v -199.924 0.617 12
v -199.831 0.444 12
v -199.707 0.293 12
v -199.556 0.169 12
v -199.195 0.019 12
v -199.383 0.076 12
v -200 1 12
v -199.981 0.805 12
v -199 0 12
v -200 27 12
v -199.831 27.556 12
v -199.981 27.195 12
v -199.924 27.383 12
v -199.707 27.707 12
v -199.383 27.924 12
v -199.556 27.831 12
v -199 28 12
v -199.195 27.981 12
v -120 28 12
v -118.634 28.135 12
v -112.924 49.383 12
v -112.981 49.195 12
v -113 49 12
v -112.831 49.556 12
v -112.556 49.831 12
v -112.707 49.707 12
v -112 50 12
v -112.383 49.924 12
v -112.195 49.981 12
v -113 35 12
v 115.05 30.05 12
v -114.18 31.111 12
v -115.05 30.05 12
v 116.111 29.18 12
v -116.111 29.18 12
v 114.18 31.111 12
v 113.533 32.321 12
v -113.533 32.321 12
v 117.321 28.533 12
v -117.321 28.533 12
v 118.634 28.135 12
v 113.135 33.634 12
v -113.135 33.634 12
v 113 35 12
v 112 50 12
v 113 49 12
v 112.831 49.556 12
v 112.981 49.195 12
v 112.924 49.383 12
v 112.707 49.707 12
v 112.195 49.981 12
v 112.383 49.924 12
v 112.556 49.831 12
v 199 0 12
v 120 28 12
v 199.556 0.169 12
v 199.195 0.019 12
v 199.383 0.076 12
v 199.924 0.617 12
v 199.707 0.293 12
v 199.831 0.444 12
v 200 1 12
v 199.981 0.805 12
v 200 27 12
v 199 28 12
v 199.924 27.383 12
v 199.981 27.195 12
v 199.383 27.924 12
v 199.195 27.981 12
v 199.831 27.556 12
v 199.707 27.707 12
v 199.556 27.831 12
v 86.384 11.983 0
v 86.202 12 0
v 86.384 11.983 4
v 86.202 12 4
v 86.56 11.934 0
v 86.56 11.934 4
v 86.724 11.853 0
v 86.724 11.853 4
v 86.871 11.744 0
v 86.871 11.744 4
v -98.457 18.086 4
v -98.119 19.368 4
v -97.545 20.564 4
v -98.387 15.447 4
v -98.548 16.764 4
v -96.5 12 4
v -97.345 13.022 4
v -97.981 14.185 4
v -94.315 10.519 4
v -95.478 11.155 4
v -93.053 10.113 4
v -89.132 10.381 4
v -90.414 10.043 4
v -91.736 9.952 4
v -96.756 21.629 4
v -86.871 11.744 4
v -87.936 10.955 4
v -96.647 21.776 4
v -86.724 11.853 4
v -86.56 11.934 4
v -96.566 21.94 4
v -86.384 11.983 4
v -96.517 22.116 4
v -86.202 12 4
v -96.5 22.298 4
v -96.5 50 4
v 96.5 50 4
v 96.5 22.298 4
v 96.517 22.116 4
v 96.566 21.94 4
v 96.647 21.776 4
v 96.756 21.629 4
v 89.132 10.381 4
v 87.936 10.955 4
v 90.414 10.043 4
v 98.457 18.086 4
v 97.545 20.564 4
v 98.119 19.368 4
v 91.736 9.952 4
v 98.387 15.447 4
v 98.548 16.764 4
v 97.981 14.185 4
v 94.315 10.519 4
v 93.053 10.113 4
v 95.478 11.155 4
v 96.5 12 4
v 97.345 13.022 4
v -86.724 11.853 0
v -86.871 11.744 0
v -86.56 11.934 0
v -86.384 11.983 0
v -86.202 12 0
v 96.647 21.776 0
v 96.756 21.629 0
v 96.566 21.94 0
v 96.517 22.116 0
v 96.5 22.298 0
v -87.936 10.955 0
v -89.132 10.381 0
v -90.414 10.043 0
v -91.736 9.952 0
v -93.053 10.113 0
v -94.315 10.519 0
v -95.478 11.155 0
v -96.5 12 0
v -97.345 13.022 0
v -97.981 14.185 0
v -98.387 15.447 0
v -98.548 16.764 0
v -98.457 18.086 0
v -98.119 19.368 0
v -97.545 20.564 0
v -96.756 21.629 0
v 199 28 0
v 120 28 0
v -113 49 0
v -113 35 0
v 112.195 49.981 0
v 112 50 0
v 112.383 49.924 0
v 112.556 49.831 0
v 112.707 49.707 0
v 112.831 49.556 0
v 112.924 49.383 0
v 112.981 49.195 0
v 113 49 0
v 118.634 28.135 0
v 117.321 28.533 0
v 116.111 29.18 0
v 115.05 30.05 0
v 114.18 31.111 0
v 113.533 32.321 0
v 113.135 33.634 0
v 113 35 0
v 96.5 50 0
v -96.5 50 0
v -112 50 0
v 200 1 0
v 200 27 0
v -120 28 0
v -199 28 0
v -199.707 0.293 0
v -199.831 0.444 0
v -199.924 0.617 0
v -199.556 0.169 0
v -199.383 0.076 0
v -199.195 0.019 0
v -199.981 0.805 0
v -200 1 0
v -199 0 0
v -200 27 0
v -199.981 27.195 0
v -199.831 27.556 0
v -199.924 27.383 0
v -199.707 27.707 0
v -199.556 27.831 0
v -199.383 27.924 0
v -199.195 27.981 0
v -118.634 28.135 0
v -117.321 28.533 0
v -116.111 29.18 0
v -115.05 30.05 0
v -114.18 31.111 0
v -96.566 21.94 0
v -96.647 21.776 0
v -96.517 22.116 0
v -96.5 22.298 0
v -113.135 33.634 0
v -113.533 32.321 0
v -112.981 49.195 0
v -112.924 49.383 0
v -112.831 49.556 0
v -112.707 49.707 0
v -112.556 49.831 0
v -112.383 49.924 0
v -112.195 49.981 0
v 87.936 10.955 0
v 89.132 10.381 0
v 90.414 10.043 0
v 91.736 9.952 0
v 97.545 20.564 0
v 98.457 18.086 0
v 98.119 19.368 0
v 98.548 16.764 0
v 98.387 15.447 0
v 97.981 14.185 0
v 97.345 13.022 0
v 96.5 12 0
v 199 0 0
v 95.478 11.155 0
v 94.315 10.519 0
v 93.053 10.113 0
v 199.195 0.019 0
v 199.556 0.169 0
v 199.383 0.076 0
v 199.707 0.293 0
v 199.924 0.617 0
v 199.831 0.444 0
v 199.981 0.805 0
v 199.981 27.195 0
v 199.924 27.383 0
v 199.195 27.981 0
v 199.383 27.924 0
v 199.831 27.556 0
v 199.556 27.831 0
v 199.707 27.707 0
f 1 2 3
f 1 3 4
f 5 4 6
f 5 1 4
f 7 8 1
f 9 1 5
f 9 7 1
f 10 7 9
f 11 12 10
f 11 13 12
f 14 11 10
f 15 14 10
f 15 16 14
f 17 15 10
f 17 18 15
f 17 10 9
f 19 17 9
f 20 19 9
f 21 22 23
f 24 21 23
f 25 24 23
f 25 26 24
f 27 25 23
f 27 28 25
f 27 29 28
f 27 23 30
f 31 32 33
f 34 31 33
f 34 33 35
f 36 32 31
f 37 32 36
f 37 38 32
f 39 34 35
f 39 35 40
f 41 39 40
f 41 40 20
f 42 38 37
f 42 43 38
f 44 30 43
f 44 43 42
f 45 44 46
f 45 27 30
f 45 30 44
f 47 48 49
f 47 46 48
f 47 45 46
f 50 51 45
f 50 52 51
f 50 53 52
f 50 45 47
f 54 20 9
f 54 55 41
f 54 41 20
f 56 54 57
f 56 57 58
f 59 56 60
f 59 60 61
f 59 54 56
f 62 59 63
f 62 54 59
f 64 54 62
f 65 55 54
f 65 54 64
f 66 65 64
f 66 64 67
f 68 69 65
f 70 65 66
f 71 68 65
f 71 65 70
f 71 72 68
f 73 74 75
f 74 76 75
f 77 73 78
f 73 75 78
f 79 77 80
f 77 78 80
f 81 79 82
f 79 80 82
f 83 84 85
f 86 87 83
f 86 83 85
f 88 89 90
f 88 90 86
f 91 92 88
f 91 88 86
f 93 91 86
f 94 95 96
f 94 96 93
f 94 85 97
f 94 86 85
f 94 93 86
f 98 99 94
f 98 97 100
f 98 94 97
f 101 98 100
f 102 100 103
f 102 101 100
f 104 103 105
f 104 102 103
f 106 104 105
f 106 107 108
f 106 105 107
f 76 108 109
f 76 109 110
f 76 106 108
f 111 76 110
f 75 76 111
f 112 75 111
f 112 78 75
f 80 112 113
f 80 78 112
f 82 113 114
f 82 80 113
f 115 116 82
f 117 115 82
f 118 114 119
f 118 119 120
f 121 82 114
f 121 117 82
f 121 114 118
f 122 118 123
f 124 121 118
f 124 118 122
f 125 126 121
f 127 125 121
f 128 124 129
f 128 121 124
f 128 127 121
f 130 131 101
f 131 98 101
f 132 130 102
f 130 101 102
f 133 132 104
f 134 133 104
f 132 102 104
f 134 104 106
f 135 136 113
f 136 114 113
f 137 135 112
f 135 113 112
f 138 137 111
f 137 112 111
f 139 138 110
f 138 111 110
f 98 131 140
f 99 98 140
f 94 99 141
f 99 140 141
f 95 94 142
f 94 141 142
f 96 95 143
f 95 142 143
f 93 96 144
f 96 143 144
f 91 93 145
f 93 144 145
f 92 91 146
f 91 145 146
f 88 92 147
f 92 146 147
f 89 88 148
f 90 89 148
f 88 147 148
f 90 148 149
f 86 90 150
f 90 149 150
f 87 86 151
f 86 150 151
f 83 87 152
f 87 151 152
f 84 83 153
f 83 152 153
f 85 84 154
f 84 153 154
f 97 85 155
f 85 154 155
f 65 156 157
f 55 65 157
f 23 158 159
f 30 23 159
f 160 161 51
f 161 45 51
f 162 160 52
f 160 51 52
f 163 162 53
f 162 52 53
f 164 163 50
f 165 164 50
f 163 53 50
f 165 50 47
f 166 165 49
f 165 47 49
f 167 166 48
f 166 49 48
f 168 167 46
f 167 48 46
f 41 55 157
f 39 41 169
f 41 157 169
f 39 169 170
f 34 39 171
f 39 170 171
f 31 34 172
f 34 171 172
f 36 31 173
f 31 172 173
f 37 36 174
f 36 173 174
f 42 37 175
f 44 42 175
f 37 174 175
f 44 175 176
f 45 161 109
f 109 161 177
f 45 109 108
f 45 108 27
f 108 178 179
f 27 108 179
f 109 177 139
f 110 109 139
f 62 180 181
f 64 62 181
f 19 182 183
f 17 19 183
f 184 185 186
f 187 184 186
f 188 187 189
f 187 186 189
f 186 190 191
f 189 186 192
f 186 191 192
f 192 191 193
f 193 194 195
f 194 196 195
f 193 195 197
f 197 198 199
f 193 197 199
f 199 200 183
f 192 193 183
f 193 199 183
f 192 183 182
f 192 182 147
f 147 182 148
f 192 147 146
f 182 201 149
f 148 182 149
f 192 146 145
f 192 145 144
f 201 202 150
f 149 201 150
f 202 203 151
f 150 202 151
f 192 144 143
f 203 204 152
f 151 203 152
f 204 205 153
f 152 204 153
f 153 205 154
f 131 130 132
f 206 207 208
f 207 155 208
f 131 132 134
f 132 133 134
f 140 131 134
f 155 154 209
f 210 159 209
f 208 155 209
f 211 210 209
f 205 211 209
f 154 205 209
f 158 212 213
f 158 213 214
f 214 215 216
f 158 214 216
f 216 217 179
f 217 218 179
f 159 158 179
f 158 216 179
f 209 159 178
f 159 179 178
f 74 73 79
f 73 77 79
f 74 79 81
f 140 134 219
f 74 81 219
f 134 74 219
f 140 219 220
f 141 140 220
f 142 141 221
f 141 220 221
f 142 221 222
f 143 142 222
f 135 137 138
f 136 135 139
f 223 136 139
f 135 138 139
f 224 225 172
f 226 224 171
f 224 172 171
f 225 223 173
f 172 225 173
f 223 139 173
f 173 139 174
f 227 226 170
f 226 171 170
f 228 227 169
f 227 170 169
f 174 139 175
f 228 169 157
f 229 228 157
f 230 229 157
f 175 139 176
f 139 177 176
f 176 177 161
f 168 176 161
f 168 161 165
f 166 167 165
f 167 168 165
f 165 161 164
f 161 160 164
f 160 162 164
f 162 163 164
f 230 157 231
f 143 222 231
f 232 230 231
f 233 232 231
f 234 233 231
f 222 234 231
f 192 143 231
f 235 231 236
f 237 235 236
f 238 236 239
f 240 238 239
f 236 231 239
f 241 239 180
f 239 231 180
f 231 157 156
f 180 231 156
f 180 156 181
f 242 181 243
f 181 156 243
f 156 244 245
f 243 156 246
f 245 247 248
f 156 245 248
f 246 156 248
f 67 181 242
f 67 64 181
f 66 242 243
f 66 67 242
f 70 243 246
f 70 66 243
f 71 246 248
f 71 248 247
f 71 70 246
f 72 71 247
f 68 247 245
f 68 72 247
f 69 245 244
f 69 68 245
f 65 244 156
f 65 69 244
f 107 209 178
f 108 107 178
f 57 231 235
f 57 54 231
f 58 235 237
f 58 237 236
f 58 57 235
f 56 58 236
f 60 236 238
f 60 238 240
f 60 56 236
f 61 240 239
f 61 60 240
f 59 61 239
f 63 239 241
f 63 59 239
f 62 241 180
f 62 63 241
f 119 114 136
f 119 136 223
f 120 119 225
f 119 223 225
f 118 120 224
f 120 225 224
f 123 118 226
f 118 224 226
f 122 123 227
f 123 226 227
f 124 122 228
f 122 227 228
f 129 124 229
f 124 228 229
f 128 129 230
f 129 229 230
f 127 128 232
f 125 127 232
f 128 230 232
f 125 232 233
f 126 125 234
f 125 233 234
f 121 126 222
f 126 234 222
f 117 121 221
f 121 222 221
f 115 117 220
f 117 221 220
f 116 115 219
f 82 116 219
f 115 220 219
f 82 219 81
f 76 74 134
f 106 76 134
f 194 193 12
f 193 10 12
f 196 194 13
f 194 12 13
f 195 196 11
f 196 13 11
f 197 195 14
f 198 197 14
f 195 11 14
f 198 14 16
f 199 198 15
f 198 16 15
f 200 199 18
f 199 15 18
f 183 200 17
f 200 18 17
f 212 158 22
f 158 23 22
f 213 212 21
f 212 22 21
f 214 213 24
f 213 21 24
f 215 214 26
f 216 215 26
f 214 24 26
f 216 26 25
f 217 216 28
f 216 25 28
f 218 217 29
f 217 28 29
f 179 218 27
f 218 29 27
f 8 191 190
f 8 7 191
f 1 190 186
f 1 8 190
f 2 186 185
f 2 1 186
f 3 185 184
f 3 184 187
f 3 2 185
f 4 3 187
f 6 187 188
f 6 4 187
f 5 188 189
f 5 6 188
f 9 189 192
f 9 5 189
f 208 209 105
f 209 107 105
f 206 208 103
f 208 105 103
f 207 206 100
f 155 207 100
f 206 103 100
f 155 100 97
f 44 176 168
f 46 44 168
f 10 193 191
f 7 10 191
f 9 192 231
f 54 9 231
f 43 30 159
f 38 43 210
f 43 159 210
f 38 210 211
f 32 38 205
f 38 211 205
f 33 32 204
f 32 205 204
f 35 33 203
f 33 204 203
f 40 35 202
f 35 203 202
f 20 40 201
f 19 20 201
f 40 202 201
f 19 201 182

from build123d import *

# Parameters (mm, degrees)
F1_DEPTH = 12
F3_DEPTH = 4
F4_R     = 1


with BuildPart() as f1:
    # F0 (on Top) → F1 (new body)
    with BuildSketch(Plane.XY):
        with BuildLine():
            Line((-200, 28), (-200, 0))
            Line((-200, 0), (200, 0))
            Line((200, 0), (200, 28))
            Line((200, 28), (120, 28))
            ThreePointArc((120, 28), (115.050253, 30.050253), (113, 35))
            Line((113, 35), (113, 50))
            Line((113, 50), (-113, 50))
            Line((-113, 50), (-113, 35))
            ThreePointArc((-113, 35), (-115.050253, 30.050253), (-120, 28))
            Line((-120, 28), (-200, 28))
        make_face()
    extrude(amount=F1_DEPTH)

    # F2 (on face) → F3 (cut)
    with BuildSketch(Plane(origin=(0, 0, 0), x_dir=(1, 0, 0), z_dir=(0, 0, -1))):
        with BuildLine():
            Line((-96.5, -21.899495), (-96.5, -50))
            Line((-96.5, -50), (96.5, -50))
            Line((96.5, -50), (96.5, -21.899495))
            ThreePointArc((96.5, -21.899495), (96.5, -12), (86.600505, -12))
            Line((86.600505, -12), (-86.600505, -12))
            ThreePointArc((-86.600505, -12), (-96.5, -12), (-96.5, -21.899495))
        make_face()
    extrude(amount=-F3_DEPTH, mode=Mode.SUBTRACT)

    # F4
    f4_edges = [f1.edges().sort_by_distance(p)[0] for p in [
        (-200, 0, 6),
        (-200, 28, 6),
        (-113, 50, 6),
        (-96.5, 21.899495, 2),
        (-86.600505, 12, 2),
        (86.600505, 12, 2),
        (96.5, 21.899495, 2),
        (113, 50, 6),
        (200, 28, 6),
        (200, 0, 6),
    ]]
    fillet(f4_edges, radius=F4_R)


solid = f1.part
